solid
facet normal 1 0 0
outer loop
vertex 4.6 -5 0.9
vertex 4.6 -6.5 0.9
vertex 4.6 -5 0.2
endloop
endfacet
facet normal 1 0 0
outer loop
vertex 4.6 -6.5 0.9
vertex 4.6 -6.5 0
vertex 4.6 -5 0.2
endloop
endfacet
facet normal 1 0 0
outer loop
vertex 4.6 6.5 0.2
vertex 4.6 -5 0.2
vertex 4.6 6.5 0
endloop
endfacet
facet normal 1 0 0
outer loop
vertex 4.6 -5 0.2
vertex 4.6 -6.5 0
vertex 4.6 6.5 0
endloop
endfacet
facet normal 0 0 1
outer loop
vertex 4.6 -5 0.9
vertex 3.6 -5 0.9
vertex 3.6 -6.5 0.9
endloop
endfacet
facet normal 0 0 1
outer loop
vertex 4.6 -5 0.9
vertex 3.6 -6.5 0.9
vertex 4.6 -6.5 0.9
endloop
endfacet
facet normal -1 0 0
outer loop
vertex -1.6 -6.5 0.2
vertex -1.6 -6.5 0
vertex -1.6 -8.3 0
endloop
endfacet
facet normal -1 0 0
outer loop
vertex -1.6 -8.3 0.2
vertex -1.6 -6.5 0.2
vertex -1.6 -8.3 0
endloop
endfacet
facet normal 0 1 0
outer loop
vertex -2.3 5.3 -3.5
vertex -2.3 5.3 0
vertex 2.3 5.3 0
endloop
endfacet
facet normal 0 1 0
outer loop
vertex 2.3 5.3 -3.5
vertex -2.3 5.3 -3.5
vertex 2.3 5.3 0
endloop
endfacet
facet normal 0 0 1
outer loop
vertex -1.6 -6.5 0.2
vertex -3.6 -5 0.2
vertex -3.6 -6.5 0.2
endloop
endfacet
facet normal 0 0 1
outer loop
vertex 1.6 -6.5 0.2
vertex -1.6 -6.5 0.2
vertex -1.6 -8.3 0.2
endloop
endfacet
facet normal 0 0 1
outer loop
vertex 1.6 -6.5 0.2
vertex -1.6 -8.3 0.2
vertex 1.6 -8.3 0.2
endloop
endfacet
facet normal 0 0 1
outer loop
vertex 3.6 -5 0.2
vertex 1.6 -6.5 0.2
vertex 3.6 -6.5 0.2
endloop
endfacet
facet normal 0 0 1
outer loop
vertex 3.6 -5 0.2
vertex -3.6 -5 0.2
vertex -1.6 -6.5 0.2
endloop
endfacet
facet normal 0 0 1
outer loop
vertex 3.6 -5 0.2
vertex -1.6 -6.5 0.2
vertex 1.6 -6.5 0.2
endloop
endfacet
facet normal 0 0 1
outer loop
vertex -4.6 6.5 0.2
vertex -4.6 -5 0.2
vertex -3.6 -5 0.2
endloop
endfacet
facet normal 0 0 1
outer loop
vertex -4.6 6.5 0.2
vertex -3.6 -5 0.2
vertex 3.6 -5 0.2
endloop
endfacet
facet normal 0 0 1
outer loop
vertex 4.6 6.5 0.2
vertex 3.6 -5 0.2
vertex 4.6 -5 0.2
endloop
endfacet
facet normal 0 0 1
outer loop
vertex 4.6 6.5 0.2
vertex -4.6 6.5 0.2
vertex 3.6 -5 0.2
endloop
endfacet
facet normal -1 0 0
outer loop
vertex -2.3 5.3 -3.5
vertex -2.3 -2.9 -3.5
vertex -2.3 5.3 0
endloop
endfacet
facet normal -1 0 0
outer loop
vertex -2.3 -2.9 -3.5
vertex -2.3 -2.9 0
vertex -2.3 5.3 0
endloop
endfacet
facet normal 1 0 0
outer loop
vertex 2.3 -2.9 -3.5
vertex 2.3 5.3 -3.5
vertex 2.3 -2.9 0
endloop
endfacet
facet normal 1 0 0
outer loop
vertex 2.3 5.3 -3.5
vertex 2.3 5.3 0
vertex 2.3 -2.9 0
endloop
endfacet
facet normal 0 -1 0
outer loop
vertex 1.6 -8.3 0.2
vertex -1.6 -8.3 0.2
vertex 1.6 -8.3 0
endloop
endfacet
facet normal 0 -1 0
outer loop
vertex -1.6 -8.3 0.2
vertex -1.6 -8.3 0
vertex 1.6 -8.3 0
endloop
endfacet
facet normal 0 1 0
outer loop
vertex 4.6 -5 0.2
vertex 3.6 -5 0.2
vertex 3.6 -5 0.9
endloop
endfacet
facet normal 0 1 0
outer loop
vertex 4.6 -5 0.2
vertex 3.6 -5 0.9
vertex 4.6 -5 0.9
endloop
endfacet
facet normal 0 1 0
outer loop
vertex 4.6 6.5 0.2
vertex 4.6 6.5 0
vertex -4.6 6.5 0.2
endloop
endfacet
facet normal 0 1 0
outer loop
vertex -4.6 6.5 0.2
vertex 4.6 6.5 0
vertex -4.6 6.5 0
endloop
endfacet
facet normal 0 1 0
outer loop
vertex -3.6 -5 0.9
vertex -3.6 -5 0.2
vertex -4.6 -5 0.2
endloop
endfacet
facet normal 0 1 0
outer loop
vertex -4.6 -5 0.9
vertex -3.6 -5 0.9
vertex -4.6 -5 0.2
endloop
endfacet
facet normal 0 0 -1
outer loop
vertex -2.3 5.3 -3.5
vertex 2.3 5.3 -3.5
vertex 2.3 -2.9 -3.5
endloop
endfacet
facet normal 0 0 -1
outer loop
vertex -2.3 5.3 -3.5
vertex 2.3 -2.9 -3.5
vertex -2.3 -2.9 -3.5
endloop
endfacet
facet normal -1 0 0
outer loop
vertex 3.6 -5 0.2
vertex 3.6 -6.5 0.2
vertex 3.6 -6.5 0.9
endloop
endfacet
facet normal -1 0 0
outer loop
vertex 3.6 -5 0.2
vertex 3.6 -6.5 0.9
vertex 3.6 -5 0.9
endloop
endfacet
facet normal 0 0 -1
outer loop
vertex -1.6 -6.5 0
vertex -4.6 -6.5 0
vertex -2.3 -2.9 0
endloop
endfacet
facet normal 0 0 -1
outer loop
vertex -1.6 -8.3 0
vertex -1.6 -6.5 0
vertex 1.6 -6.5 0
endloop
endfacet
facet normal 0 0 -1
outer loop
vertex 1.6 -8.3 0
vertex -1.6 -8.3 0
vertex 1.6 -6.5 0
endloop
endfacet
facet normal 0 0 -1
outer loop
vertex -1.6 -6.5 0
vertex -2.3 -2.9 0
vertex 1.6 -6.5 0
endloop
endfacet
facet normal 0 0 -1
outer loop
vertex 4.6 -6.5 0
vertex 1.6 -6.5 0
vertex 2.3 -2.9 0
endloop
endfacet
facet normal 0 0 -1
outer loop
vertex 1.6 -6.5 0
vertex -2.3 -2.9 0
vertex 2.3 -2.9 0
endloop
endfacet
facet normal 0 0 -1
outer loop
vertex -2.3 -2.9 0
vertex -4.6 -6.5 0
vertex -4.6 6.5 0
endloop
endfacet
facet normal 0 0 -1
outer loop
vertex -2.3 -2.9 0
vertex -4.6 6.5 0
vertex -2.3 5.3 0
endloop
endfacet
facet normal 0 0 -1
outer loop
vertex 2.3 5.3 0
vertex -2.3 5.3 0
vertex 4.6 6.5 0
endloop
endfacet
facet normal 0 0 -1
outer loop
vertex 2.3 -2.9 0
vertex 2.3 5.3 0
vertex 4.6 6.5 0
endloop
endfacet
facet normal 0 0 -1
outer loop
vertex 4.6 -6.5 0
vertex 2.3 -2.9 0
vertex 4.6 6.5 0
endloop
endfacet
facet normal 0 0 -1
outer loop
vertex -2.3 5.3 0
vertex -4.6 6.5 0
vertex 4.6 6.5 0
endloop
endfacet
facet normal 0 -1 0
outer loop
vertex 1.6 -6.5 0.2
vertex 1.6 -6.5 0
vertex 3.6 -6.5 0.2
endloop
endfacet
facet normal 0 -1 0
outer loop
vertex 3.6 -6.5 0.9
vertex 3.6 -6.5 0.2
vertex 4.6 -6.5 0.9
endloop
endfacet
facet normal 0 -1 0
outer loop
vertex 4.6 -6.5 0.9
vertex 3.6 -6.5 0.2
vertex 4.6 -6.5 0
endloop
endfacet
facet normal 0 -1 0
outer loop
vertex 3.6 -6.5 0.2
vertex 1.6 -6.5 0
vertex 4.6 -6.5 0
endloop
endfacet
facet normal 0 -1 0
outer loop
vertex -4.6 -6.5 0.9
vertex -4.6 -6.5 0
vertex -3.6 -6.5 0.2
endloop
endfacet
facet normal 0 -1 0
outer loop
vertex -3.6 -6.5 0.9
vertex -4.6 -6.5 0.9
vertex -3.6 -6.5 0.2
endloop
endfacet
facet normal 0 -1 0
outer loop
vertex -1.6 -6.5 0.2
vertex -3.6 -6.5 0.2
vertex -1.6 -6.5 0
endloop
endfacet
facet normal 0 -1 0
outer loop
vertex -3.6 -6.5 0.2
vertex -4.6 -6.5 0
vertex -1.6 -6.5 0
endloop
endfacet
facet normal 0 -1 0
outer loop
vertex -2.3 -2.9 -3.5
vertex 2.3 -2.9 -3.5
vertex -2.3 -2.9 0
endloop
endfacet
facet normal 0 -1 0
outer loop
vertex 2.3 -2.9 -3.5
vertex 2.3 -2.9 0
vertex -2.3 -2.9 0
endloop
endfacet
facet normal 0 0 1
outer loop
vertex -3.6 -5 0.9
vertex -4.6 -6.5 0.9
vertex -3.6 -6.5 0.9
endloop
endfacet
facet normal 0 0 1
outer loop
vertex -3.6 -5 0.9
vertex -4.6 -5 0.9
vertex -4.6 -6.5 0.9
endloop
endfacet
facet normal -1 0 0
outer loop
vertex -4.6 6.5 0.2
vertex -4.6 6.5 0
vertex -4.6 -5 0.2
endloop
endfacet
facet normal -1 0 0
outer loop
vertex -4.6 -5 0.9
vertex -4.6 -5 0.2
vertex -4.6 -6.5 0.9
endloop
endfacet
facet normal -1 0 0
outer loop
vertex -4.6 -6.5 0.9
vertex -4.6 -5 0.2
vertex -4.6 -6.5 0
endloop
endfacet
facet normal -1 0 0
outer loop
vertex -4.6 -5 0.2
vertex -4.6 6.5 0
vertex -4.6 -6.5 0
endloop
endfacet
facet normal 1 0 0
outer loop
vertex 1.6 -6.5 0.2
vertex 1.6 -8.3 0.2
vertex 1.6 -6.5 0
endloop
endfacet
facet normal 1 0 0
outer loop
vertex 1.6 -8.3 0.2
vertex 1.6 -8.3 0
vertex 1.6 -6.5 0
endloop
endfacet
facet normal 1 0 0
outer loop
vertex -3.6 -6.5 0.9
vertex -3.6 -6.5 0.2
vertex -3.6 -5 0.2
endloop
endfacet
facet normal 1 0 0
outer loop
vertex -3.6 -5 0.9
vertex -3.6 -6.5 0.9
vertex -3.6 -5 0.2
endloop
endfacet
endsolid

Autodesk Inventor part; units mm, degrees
ref_plane "YZ Plane" through (0, 0, 0) normal (1, 0, 0) x (0, 1, 0)
ref_plane "XZ Plane" through (0, 0, 0) normal (0, 1, 0) x (-1, 0, 0)
ref_plane "XY Plane" through (0, 0, 0) normal (0, 0, 1) x (1, 0, 0)
sketch "スケッチ1" plane through (0, 0, 0) normal (0, 0, 1) x (1, 0, 0)
  line L0 (-4.6, -6.5) -> (4.6, -6.5)
  line L1 (4.6, -6.5) -> (4.6, 6.5)
  line L2 (4.6, 6.5) -> (-4.6, 6.5)
  line L3 (-4.6, 6.5) -> (-4.6, -6.5)
  line L4 (-4.6, -6.5) -> (4.6, 6.5) construction
  line L5 (4.6, -6.5) -> (-4.6, 6.5) construction
  point P0 (0, 0)
  dimension "d0" = 9.2
  dimension "d1" = 13
extrude "押し出し1" add sketch "スケッチ1" along normal blind 0.2
sketch "スケッチ2" plane through (0, 0, 0.2) normal (0, 0, 1) x (1, 0, 0)
  line L0 (-4.6, -6.5) -> (-3.6, -6.5)
  line L1 (-3.6, -6.5) -> (-3.6, -5)
  line L2 (-3.6, -5) -> (-4.6, -5)
  line L3 (-4.6, -5) -> (-4.6, -6.5)
  line L4 (-4.6, -6.5) -> (4.6, -6.5) projected
  line L5 (4.6, -6.5) -> (3.6, -6.5)
  line L6 (3.6, -6.5) -> (3.6, -5)
  line L7 (3.6, -5) -> (4.6, -5)
  line L8 (4.6, -5) -> (4.6, -6.5)
  point P0 (0, 0)
  dimension "d4" = 1.5
  dimension "d5" = 1
extrude "押し出し2" add sketch "スケッチ2" along normal blind 0.7
sketch "スケッチ3" plane through (0, 0, 0) normal (0, 0, -1) x (-1, 0, 0)
  line L0 (-2.3, -2.9) -> (2.3, -2.9)
  line L1 (2.3, -2.9) -> (2.3, 5.3)
  line L2 (2.3, 5.3) -> (-2.3, 5.3)
  line L3 (-2.3, 5.3) -> (-2.3, -2.9)
  line L4 (-2.3, -2.9) -> (2.3, 5.3) construction
  line L5 (2.3, -2.9) -> (-2.3, 5.3) construction
  line L6 (-4.6, 6.5) -> (4.6, 6.5) projected
  point P0 (0, 0)
  point P1 (0, 1.2)
  point P2 (0, 1.2)
  dimension "d8" = 1.2
  dimension "d9" = 4.6
  dimension "d10" = 8.2
extrude "押し出し3" add sketch "スケッチ3" along normal blind 3.5
sketch "スケッチ4" plane through (0, 0, 0) normal (0, 0, -1) x (-1, 0, 0)
  line L0 (-1.6, -6.5) -> (1.6, -6.5)
  line L1 (1.6, -6.5) -> (1.6, -8.3)
  line L2 (1.6, -8.3) -> (-1.6, -8.3)
  line L3 (-1.6, -8.3) -> (-1.6, -6.5)
  line L4 (4.6, -6.5) -> (-4.6, -6.5) projected
  point P0 (0, 0)
  point P1 (0, -6.5)
  point P2 (0, -6.5)
  dimension "d13" = 3.2
  dimension "d14" = 1.8
extrude "押し出し4" add sketch "スケッチ4" against normal up to surface (0.2 mm away)
properties part number "terminal"
